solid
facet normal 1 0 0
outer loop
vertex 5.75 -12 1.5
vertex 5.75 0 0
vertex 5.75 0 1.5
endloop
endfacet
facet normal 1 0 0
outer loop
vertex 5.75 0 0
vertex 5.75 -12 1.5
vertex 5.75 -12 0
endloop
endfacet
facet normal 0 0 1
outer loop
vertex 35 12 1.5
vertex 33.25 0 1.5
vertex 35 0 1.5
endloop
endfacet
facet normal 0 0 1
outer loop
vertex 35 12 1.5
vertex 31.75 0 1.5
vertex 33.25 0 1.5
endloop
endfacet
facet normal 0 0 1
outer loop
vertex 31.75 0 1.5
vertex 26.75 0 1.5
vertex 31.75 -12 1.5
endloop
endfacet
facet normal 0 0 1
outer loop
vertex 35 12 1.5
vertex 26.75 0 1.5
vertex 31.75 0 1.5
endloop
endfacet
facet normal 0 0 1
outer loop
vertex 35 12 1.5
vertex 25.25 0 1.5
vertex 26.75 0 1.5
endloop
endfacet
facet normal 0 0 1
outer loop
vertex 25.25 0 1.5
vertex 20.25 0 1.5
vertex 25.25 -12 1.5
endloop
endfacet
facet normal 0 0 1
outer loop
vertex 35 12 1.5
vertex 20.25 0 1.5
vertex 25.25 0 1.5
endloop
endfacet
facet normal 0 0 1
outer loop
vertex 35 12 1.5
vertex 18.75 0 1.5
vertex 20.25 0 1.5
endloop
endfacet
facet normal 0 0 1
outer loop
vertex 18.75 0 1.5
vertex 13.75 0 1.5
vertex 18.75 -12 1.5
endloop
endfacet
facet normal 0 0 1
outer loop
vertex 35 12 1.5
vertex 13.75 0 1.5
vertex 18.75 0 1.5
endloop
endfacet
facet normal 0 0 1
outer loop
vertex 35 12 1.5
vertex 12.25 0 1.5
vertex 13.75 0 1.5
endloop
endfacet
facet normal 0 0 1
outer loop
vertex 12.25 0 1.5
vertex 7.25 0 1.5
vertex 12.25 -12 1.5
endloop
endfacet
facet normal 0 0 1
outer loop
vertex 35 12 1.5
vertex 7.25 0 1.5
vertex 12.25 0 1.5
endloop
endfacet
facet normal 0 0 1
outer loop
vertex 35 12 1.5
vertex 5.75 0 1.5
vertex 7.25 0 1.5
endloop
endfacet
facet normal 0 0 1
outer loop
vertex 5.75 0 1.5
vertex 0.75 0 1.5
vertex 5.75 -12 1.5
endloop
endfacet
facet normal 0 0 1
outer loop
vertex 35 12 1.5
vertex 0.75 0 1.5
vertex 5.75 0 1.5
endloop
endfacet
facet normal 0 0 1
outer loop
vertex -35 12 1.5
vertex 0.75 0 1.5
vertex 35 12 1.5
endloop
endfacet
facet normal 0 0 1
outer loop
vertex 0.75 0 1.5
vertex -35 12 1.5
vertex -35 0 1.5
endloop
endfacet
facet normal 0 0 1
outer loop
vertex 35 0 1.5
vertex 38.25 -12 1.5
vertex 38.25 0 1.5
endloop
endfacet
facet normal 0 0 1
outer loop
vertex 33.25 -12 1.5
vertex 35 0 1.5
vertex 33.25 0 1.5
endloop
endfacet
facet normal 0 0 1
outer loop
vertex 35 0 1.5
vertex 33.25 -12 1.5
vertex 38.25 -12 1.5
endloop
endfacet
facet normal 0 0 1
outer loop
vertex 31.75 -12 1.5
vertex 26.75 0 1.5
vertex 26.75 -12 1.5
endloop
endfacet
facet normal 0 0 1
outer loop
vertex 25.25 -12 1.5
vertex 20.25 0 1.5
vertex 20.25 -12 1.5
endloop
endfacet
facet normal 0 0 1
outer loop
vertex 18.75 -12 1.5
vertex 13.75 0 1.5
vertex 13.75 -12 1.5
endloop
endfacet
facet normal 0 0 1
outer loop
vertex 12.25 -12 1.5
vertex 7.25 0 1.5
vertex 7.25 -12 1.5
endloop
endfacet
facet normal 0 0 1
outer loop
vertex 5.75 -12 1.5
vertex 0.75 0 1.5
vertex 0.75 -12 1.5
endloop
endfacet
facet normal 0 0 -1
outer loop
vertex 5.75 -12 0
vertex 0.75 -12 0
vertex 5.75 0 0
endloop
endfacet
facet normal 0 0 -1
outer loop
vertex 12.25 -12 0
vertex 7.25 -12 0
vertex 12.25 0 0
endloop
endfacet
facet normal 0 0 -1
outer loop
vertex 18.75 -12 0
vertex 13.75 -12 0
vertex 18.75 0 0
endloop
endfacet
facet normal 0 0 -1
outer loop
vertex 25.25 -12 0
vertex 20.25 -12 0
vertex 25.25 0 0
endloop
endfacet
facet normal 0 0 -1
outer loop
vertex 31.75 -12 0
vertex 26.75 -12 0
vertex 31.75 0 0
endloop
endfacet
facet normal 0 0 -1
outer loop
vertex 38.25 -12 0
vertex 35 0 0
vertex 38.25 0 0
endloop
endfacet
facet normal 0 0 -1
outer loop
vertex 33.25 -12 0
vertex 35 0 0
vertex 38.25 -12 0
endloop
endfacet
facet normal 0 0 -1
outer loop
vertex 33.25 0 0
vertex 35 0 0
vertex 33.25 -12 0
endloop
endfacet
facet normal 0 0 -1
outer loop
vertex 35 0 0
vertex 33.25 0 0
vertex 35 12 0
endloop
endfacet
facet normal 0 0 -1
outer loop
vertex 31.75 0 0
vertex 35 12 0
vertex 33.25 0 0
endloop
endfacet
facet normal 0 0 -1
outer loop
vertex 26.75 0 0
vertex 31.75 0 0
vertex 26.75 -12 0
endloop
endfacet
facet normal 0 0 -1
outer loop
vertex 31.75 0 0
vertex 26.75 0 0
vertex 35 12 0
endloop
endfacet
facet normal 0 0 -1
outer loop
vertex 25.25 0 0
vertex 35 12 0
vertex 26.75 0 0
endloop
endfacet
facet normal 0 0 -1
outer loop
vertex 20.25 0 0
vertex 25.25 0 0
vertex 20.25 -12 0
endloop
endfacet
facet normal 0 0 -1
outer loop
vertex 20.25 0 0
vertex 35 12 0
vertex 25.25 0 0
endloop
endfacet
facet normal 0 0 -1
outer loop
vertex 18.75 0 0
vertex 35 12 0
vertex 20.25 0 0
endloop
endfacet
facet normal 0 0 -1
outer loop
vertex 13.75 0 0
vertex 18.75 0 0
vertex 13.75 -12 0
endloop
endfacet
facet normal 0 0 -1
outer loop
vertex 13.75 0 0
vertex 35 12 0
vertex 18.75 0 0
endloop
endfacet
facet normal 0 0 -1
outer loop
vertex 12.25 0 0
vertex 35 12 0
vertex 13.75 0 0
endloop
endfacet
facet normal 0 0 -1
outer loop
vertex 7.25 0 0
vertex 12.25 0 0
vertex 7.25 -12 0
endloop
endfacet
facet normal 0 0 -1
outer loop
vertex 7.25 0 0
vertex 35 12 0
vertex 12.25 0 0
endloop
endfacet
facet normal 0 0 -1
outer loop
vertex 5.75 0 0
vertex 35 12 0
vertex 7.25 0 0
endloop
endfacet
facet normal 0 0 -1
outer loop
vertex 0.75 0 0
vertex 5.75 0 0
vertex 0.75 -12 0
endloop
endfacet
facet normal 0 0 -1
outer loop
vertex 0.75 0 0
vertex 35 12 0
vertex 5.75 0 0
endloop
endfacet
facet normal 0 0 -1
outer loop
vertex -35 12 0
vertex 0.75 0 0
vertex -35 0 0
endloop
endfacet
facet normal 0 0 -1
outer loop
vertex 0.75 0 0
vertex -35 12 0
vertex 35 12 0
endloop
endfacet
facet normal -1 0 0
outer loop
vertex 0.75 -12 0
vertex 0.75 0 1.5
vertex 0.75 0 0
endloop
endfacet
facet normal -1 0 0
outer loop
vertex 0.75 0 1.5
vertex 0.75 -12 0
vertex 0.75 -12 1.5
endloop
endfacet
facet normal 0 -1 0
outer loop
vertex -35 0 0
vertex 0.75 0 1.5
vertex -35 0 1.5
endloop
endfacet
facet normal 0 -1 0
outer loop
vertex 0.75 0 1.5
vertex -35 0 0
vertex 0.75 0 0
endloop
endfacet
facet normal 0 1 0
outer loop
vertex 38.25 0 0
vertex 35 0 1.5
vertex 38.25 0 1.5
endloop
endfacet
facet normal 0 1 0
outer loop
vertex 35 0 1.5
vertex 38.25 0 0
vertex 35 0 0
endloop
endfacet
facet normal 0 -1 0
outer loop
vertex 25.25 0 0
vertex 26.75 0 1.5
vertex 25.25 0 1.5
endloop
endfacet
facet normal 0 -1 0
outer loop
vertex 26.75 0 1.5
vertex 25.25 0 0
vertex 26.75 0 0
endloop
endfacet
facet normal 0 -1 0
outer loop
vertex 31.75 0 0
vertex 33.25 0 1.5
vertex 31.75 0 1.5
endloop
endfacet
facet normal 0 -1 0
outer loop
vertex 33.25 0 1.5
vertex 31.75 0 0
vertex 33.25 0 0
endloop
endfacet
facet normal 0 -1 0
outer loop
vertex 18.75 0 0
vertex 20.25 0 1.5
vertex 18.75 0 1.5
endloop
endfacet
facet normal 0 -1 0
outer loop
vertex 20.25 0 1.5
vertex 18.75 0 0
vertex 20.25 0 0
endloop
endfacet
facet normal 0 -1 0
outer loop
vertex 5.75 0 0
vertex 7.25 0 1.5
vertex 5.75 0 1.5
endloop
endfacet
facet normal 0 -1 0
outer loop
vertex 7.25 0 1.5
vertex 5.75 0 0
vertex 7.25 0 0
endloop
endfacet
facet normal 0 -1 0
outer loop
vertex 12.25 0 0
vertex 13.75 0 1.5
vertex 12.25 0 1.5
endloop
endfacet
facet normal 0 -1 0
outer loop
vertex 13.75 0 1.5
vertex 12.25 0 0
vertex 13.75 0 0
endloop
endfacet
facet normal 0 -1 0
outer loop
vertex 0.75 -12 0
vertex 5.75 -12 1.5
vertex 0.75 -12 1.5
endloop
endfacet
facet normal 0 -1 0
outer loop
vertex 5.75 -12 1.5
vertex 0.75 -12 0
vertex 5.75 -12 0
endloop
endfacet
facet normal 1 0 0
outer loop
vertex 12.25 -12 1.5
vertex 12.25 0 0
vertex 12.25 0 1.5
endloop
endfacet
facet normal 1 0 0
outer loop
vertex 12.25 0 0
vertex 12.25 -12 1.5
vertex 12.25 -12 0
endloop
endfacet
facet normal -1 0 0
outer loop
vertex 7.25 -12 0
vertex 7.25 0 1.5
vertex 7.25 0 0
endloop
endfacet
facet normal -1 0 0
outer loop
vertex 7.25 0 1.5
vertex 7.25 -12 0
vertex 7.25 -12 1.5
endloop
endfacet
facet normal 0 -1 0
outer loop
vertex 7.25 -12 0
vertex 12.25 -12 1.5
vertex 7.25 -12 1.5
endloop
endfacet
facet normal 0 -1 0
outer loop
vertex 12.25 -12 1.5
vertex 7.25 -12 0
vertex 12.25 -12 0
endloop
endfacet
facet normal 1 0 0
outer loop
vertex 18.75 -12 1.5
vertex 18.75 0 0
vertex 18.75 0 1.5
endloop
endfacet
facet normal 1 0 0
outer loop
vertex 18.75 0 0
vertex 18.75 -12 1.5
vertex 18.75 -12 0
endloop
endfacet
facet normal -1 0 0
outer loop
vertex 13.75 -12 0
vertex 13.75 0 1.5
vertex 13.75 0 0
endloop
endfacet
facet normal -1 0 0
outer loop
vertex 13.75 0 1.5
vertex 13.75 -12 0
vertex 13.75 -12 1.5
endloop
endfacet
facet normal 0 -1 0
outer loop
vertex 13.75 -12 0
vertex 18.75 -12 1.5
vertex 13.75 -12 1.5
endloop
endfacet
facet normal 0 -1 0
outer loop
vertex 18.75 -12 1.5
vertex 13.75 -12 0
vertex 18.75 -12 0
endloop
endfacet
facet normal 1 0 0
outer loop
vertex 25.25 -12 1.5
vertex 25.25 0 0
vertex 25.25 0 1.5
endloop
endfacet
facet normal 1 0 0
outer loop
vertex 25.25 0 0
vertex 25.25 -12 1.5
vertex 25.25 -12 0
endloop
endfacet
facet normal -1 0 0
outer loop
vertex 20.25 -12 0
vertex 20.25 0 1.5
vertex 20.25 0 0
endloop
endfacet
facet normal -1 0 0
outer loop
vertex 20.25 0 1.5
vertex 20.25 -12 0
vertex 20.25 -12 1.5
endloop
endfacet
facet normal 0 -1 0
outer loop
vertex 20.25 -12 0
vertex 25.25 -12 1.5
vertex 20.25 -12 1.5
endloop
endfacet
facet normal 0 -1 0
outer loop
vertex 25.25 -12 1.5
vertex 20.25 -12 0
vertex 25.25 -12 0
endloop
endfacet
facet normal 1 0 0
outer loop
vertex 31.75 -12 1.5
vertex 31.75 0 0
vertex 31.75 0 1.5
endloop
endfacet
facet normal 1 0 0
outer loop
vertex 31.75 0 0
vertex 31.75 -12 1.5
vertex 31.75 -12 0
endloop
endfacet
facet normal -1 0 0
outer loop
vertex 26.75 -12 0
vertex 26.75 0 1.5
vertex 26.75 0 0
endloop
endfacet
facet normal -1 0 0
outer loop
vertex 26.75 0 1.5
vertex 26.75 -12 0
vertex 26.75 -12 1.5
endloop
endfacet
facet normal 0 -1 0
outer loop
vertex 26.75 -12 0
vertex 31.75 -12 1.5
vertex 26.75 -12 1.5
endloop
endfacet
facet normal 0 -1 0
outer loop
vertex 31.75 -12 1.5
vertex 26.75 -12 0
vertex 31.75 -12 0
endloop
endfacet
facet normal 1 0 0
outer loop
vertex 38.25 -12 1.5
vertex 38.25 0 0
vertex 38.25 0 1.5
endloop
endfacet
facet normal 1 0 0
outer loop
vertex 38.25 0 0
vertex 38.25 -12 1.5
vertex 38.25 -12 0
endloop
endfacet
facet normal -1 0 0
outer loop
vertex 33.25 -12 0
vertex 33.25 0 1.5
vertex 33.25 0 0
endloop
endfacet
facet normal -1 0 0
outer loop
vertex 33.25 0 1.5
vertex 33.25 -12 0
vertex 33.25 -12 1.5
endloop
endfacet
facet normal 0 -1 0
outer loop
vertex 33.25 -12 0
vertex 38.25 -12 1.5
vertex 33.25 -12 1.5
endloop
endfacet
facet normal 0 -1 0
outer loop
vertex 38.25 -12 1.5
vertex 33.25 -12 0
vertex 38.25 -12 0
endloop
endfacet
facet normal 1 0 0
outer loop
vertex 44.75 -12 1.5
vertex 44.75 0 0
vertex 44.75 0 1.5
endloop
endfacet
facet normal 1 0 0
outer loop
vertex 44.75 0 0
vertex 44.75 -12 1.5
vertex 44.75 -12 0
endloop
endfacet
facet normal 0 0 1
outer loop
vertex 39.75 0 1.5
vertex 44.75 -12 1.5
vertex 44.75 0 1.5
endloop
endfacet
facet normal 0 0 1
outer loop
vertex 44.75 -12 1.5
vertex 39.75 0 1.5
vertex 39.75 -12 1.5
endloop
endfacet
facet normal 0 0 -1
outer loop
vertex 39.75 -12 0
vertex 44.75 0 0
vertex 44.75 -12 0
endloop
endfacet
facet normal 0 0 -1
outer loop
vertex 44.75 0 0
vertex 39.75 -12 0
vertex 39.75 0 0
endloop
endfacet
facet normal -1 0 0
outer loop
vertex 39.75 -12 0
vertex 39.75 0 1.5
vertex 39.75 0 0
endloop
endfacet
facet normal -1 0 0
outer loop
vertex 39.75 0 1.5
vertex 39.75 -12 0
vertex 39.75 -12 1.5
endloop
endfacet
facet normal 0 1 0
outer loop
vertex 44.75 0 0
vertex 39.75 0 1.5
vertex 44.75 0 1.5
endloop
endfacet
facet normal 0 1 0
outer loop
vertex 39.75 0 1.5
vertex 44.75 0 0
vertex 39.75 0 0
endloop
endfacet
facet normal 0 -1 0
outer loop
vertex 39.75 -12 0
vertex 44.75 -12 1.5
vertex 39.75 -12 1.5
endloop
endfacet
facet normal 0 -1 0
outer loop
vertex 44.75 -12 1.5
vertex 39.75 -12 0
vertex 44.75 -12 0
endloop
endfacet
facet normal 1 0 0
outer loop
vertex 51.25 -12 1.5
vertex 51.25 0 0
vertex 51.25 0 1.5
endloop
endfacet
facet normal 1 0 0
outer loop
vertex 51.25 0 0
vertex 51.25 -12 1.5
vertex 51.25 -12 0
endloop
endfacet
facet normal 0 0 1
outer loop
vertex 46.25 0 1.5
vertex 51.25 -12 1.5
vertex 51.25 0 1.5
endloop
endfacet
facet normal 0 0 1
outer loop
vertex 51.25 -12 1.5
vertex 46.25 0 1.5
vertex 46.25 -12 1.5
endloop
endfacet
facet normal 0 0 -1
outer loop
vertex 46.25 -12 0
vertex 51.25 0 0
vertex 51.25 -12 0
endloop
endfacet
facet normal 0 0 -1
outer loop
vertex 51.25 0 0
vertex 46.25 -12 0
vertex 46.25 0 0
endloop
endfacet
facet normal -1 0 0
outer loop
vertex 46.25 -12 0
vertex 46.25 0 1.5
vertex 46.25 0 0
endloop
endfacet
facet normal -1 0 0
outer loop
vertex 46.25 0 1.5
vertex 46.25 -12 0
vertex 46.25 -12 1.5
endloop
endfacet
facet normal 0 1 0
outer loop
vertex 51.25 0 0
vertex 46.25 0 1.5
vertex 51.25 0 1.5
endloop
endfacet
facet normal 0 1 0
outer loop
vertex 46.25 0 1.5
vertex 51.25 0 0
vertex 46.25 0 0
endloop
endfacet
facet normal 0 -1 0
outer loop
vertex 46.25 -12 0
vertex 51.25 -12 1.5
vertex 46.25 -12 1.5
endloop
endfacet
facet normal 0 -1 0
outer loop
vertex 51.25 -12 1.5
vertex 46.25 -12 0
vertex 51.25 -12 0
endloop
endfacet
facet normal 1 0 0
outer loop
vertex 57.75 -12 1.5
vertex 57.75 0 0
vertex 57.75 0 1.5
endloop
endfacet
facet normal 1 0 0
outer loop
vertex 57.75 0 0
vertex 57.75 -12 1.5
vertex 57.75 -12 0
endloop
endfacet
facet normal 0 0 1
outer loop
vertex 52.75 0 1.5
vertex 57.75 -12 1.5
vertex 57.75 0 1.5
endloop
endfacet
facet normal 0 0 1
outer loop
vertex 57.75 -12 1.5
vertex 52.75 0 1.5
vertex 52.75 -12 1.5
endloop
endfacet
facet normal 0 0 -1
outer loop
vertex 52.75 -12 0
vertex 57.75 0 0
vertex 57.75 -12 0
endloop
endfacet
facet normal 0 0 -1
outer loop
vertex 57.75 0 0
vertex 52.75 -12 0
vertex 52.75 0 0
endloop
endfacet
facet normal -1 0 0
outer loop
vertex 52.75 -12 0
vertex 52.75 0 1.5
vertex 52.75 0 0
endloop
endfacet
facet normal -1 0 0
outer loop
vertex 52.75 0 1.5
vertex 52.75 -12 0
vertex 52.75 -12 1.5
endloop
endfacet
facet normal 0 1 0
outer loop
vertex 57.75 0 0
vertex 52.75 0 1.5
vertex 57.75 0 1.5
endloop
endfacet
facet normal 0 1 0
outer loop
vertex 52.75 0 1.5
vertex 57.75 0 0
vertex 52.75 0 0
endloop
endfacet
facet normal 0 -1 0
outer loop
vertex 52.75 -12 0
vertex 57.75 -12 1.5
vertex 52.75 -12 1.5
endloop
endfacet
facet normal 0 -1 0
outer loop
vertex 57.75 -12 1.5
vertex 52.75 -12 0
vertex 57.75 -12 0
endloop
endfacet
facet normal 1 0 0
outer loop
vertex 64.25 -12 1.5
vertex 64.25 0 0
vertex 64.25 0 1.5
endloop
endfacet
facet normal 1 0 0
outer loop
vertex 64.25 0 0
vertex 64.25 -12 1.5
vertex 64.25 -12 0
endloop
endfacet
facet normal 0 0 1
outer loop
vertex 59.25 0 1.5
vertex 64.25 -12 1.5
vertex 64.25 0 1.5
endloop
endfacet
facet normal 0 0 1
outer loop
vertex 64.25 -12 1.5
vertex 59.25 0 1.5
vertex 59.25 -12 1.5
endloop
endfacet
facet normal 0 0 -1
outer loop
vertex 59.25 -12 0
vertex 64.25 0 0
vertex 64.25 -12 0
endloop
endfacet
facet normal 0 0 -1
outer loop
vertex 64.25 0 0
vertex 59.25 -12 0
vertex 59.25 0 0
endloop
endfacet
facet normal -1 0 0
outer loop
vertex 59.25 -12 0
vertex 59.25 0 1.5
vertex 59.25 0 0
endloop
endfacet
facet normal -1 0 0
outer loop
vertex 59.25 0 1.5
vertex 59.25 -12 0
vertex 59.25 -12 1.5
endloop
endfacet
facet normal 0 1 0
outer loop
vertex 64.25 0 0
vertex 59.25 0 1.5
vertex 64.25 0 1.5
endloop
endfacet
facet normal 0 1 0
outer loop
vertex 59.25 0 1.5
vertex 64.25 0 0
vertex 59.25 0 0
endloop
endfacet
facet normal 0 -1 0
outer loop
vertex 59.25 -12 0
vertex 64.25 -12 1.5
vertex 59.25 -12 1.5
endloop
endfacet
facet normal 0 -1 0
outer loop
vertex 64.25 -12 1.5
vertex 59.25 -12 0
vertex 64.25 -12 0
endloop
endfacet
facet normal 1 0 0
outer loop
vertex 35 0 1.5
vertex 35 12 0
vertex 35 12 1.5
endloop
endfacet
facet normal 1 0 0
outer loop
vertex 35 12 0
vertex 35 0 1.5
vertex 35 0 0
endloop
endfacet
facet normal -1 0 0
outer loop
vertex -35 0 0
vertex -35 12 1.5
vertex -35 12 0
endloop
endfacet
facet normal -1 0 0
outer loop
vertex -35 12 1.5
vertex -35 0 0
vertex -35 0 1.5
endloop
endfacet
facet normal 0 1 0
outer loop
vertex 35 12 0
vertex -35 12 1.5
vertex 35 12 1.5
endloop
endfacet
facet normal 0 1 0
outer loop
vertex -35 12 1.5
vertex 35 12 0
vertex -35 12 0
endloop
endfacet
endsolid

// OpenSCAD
// 10-well agarose gel comb
// Designed for FDM printing - printed lying flat on the XY plane

// --- Dimensions ---
spine_length = 70.0;      // X dimension of the spine
spine_width = 12.0;       // Y dimension of the spine
plate_thickness = 1.5;    // Z dimension (height)

tooth_width = 5.0;        // X dimension of each tooth
tooth_length = 12.0;      // Y dimension of each tooth (extending from spine)
num_teeth = 10;           // Number of teeth/wells

gap_between_teeth = 1.5;  // X dimension of the gap between teeth

// Calculated values
// Total width of the tooth array (teeth + gaps)
// There are (num_teeth - 1) gaps
total_teeth_width = (num_teeth * tooth_width) + ((num_teeth - 1) * gap_between_teeth);

// Offset to center the teeth array on the spine in X
x_offset = (spine_length - total_teeth_width) / 2;

// --- Parameters ---
$fn = 64;

// --- Geometry ---

// The main body of the comb
union() {
    // The Spine (Back bar)
    // Centered on X. Placed from Y=0 to Y=spine_width.
    translate([-spine_length/2, 0, 0])
        cube([spine_length, spine_width, plate_thickness]);

    // The Teeth
    // We iterate to create 10 teeth.
    // The teeth are attached to the edge at Y = 0 and extend to Y = -tooth_length.
    for (i = [0 : num_teeth - 1]) {
        // Calculate X position for this specific tooth
        // We use a temporary variable inside the loop to avoid 'let' syntax errors in older OpenSCAD versions
        // The first tooth starts at x_offset.
        // Each subsequent tooth starts at x_offset + (i * (tooth_width + gap))
        
        // Calculate the left edge of the current tooth
        // We use a loop variable approach to ensure compatibility
        translate([x_offset + (i * (tooth_width + gap_between_teeth)) - tooth_width/2, -tooth_length, 0])
            cube([tooth_width, tooth_length, plate_thickness]);
    }
}

// Note on orientation:
// The spine is a rectangle from X: [-35, 35], Y: [0, 12]
// The teeth extend from Y: [0, -12]
// The entire part is centered on X.
// The part rests on the XY plane (Z=0).
